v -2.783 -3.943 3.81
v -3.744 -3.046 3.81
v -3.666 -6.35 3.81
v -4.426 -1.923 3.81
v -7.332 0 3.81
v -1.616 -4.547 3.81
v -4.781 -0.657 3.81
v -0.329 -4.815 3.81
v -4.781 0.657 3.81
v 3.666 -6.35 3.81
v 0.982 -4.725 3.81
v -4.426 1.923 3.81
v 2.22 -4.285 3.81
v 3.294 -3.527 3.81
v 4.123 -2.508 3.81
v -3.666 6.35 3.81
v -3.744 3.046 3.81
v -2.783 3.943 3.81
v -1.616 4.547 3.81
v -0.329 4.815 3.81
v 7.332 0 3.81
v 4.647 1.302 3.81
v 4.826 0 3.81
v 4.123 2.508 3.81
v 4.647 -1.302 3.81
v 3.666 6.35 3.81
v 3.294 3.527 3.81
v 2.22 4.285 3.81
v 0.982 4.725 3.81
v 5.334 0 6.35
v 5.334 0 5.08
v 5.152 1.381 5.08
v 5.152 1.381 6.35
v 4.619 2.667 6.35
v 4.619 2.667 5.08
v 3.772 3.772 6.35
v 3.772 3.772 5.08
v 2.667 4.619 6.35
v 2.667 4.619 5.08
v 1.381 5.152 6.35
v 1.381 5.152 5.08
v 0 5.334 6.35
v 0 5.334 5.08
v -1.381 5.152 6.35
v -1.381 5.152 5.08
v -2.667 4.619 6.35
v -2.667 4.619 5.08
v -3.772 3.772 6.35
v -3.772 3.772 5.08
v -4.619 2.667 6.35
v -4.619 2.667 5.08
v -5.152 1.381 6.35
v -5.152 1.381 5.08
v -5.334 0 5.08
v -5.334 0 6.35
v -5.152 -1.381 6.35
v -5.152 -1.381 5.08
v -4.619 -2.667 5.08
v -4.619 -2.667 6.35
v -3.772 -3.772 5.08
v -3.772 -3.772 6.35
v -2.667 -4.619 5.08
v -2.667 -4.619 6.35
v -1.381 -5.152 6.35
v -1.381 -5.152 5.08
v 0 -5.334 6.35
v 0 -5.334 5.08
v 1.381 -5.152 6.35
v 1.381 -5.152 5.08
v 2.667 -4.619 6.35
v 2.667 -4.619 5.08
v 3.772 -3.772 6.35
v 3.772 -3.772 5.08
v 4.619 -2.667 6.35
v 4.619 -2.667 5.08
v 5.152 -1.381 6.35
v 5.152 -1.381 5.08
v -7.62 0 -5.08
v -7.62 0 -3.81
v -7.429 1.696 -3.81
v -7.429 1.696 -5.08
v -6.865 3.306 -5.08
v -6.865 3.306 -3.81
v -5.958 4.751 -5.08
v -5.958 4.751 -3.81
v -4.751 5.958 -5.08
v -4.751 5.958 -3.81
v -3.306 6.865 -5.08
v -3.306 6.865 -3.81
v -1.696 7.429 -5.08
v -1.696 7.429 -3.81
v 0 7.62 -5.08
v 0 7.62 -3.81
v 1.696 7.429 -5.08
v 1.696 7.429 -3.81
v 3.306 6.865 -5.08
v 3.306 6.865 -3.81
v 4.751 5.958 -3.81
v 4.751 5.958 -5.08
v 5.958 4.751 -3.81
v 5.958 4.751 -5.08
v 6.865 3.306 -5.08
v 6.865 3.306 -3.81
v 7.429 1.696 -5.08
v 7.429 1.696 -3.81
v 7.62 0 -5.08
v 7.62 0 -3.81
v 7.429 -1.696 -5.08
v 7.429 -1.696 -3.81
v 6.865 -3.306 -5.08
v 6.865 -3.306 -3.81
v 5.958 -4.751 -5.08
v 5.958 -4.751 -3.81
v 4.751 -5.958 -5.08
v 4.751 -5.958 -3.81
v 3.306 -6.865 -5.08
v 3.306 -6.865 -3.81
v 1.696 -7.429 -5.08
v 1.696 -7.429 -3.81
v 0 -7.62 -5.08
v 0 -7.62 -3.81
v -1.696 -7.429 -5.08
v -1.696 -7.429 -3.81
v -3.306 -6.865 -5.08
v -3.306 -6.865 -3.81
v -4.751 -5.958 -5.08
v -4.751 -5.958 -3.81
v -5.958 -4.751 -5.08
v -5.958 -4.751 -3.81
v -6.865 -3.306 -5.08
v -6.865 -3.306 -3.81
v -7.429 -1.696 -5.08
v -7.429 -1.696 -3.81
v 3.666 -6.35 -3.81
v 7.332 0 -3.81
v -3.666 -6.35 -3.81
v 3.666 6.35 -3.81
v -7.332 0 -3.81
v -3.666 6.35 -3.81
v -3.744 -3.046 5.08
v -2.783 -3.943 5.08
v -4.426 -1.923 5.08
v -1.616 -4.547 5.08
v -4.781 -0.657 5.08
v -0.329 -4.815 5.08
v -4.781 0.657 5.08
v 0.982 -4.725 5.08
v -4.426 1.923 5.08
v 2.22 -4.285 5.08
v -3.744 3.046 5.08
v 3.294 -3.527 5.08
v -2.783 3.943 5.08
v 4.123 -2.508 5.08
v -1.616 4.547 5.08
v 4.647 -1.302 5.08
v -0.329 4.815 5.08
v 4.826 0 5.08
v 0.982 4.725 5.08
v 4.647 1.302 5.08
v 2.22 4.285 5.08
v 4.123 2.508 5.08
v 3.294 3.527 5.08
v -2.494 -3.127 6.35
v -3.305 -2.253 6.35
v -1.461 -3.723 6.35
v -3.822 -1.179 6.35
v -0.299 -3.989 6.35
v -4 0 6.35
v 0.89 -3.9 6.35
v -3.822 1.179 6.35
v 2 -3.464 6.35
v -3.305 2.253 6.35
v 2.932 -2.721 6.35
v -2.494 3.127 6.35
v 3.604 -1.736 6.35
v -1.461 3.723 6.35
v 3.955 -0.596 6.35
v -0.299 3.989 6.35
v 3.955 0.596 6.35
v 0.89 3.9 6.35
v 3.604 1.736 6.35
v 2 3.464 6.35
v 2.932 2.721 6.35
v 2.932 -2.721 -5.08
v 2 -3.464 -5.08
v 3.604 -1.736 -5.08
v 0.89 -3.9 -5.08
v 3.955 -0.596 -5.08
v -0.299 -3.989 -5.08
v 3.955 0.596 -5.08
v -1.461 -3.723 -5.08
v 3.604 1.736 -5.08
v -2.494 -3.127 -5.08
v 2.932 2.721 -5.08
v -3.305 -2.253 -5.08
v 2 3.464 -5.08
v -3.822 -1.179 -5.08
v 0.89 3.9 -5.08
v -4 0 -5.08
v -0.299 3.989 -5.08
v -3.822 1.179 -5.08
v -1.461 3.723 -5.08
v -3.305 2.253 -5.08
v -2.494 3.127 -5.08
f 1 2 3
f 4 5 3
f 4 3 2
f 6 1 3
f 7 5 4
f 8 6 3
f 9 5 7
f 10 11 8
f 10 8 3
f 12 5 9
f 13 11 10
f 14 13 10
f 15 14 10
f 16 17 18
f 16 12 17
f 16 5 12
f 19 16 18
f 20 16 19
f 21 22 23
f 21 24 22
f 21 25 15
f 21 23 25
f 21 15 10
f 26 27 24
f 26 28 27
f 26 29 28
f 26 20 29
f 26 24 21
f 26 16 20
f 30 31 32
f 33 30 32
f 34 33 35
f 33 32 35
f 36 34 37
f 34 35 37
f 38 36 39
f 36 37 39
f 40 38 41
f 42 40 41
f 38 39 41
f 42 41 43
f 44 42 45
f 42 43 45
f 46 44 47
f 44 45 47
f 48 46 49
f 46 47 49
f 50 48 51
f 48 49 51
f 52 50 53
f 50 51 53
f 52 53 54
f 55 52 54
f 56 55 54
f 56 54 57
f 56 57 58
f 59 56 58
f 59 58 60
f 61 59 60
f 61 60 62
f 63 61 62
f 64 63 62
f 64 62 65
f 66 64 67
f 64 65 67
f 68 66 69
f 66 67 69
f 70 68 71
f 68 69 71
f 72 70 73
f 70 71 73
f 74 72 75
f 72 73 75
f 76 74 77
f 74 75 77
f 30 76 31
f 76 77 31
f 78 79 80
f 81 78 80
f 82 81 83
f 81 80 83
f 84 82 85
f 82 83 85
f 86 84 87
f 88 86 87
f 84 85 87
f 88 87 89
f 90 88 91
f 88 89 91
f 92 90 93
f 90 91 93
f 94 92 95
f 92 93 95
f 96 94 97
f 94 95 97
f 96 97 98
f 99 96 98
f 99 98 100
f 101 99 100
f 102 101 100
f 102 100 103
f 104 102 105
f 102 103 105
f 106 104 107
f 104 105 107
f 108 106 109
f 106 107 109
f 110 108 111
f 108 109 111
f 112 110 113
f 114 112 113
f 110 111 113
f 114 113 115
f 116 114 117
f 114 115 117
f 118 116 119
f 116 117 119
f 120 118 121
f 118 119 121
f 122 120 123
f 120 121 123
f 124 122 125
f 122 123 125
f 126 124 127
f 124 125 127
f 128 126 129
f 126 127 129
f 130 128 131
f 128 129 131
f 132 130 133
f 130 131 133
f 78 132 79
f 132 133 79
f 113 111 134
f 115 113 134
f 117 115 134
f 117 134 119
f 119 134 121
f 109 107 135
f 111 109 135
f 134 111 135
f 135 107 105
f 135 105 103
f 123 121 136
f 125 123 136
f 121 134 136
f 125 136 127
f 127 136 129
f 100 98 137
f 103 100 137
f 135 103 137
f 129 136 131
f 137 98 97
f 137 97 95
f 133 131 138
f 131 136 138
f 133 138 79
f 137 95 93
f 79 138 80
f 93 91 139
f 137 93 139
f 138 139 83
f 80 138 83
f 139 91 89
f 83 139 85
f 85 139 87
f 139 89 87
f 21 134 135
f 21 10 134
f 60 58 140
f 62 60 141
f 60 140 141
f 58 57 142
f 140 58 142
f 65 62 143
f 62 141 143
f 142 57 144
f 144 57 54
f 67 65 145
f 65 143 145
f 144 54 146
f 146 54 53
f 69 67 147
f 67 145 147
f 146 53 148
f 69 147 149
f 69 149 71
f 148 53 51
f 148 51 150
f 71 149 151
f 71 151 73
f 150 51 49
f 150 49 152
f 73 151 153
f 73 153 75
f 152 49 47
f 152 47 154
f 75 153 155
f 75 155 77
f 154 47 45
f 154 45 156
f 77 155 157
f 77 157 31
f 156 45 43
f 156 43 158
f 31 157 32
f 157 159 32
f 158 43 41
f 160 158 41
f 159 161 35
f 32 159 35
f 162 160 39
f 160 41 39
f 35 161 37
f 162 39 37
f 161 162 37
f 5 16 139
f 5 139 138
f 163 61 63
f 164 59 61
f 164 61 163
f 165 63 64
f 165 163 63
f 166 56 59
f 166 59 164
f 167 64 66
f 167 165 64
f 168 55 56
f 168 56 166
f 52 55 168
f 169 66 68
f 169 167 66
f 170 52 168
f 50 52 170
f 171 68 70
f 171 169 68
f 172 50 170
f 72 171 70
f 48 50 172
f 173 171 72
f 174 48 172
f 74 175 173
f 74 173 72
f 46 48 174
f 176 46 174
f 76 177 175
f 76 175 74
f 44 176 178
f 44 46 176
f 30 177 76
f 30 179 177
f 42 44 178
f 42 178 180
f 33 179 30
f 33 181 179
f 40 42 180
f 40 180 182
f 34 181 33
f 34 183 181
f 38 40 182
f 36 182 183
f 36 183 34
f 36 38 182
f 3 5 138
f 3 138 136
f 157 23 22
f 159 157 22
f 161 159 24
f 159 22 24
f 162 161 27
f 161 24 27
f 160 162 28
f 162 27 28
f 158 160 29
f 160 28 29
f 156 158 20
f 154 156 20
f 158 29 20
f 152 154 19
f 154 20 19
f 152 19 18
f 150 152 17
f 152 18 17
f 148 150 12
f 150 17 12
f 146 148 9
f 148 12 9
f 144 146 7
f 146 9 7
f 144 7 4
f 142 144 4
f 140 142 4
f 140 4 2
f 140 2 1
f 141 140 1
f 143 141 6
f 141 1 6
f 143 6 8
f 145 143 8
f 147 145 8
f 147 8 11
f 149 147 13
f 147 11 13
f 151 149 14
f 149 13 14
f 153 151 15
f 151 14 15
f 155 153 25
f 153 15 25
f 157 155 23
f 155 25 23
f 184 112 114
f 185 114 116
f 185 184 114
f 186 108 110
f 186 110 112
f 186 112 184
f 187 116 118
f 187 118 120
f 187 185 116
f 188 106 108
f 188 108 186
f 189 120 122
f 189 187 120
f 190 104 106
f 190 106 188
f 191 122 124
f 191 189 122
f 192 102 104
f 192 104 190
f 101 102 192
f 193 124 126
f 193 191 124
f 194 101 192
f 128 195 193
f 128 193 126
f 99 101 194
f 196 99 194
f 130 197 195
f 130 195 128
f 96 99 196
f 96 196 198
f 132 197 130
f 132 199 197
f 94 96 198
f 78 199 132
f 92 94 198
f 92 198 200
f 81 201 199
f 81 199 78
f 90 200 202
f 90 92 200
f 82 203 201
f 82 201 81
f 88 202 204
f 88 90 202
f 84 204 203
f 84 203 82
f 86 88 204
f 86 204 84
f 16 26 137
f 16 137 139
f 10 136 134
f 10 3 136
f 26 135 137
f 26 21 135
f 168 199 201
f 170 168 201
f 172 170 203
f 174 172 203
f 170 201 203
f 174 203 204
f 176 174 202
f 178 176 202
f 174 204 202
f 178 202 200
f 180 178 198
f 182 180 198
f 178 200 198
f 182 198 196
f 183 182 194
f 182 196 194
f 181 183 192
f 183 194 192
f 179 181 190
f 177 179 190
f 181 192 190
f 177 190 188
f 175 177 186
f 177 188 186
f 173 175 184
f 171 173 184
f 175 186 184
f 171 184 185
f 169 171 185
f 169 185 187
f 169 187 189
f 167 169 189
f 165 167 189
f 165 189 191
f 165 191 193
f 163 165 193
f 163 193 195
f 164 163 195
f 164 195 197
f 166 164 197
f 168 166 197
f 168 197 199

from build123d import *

# Parameters (mm, degrees)
BOSS_EXTRU_1_DEPTH      = 3.81
ESQUISSE2_R             = 7.62
BOSS_EXTRU_2_DEPTH      = 1.27
ESQUISSE3_R             = 4.826
BOSS_EXTRU_3_DEPTH      = 1.27
ESQUISSE4_R             = 5.334
BOSS_EXTRU_4_DEPTH      = 1.27
ESQUISSE5_R             = 4
ENL_V_MAT_EXTRU_1_DEPTH = 16.709032434


with BuildPart() as part:
    # Esquisse1 → Boss.-Extru.1 (new, symmetric)
    with BuildSketch(Plane.XY):
        Polygon((7.332348419, 0), (3.666174209, 6.35), (-3.666174209, 6.35), (-7.332348419, 0), (-3.666174209, -6.35), (3.666174209, -6.35), align=None)
    extrude(amount=BOSS_EXTRU_1_DEPTH, both=True)

    # Esquisse2 → Boss.-Extru.2 (add)
    with BuildSketch(Plane(origin=(0, 0, -3.81), x_dir=(-1, 0, 0), z_dir=(0, 0, -1))):
        Circle(ESQUISSE2_R)
    extrude(amount=BOSS_EXTRU_2_DEPTH)

    # Esquisse3 → Boss.-Extru.3 (add)
    with BuildSketch(Plane.XY.offset(3.81)):
        Circle(ESQUISSE3_R)
    extrude(amount=BOSS_EXTRU_3_DEPTH)

    # Esquisse4 → Boss.-Extru.4 (add)
    with BuildSketch(Plane.XY.offset(5.08)):
        Circle(ESQUISSE4_R)
    extrude(amount=BOSS_EXTRU_4_DEPTH)

    # Esquisse5 → Enlèv. mat.-Extru.1 (cut, through all)
    with BuildSketch(Plane(origin=(0, 0, -5.08), x_dir=(-1, 0, 0), z_dir=(0, 0, -1))):
        Circle(ESQUISSE5_R)
    extrude(amount=-ENL_V_MAT_EXTRU_1_DEPTH, mode=Mode.SUBTRACT)


solid = part.part
